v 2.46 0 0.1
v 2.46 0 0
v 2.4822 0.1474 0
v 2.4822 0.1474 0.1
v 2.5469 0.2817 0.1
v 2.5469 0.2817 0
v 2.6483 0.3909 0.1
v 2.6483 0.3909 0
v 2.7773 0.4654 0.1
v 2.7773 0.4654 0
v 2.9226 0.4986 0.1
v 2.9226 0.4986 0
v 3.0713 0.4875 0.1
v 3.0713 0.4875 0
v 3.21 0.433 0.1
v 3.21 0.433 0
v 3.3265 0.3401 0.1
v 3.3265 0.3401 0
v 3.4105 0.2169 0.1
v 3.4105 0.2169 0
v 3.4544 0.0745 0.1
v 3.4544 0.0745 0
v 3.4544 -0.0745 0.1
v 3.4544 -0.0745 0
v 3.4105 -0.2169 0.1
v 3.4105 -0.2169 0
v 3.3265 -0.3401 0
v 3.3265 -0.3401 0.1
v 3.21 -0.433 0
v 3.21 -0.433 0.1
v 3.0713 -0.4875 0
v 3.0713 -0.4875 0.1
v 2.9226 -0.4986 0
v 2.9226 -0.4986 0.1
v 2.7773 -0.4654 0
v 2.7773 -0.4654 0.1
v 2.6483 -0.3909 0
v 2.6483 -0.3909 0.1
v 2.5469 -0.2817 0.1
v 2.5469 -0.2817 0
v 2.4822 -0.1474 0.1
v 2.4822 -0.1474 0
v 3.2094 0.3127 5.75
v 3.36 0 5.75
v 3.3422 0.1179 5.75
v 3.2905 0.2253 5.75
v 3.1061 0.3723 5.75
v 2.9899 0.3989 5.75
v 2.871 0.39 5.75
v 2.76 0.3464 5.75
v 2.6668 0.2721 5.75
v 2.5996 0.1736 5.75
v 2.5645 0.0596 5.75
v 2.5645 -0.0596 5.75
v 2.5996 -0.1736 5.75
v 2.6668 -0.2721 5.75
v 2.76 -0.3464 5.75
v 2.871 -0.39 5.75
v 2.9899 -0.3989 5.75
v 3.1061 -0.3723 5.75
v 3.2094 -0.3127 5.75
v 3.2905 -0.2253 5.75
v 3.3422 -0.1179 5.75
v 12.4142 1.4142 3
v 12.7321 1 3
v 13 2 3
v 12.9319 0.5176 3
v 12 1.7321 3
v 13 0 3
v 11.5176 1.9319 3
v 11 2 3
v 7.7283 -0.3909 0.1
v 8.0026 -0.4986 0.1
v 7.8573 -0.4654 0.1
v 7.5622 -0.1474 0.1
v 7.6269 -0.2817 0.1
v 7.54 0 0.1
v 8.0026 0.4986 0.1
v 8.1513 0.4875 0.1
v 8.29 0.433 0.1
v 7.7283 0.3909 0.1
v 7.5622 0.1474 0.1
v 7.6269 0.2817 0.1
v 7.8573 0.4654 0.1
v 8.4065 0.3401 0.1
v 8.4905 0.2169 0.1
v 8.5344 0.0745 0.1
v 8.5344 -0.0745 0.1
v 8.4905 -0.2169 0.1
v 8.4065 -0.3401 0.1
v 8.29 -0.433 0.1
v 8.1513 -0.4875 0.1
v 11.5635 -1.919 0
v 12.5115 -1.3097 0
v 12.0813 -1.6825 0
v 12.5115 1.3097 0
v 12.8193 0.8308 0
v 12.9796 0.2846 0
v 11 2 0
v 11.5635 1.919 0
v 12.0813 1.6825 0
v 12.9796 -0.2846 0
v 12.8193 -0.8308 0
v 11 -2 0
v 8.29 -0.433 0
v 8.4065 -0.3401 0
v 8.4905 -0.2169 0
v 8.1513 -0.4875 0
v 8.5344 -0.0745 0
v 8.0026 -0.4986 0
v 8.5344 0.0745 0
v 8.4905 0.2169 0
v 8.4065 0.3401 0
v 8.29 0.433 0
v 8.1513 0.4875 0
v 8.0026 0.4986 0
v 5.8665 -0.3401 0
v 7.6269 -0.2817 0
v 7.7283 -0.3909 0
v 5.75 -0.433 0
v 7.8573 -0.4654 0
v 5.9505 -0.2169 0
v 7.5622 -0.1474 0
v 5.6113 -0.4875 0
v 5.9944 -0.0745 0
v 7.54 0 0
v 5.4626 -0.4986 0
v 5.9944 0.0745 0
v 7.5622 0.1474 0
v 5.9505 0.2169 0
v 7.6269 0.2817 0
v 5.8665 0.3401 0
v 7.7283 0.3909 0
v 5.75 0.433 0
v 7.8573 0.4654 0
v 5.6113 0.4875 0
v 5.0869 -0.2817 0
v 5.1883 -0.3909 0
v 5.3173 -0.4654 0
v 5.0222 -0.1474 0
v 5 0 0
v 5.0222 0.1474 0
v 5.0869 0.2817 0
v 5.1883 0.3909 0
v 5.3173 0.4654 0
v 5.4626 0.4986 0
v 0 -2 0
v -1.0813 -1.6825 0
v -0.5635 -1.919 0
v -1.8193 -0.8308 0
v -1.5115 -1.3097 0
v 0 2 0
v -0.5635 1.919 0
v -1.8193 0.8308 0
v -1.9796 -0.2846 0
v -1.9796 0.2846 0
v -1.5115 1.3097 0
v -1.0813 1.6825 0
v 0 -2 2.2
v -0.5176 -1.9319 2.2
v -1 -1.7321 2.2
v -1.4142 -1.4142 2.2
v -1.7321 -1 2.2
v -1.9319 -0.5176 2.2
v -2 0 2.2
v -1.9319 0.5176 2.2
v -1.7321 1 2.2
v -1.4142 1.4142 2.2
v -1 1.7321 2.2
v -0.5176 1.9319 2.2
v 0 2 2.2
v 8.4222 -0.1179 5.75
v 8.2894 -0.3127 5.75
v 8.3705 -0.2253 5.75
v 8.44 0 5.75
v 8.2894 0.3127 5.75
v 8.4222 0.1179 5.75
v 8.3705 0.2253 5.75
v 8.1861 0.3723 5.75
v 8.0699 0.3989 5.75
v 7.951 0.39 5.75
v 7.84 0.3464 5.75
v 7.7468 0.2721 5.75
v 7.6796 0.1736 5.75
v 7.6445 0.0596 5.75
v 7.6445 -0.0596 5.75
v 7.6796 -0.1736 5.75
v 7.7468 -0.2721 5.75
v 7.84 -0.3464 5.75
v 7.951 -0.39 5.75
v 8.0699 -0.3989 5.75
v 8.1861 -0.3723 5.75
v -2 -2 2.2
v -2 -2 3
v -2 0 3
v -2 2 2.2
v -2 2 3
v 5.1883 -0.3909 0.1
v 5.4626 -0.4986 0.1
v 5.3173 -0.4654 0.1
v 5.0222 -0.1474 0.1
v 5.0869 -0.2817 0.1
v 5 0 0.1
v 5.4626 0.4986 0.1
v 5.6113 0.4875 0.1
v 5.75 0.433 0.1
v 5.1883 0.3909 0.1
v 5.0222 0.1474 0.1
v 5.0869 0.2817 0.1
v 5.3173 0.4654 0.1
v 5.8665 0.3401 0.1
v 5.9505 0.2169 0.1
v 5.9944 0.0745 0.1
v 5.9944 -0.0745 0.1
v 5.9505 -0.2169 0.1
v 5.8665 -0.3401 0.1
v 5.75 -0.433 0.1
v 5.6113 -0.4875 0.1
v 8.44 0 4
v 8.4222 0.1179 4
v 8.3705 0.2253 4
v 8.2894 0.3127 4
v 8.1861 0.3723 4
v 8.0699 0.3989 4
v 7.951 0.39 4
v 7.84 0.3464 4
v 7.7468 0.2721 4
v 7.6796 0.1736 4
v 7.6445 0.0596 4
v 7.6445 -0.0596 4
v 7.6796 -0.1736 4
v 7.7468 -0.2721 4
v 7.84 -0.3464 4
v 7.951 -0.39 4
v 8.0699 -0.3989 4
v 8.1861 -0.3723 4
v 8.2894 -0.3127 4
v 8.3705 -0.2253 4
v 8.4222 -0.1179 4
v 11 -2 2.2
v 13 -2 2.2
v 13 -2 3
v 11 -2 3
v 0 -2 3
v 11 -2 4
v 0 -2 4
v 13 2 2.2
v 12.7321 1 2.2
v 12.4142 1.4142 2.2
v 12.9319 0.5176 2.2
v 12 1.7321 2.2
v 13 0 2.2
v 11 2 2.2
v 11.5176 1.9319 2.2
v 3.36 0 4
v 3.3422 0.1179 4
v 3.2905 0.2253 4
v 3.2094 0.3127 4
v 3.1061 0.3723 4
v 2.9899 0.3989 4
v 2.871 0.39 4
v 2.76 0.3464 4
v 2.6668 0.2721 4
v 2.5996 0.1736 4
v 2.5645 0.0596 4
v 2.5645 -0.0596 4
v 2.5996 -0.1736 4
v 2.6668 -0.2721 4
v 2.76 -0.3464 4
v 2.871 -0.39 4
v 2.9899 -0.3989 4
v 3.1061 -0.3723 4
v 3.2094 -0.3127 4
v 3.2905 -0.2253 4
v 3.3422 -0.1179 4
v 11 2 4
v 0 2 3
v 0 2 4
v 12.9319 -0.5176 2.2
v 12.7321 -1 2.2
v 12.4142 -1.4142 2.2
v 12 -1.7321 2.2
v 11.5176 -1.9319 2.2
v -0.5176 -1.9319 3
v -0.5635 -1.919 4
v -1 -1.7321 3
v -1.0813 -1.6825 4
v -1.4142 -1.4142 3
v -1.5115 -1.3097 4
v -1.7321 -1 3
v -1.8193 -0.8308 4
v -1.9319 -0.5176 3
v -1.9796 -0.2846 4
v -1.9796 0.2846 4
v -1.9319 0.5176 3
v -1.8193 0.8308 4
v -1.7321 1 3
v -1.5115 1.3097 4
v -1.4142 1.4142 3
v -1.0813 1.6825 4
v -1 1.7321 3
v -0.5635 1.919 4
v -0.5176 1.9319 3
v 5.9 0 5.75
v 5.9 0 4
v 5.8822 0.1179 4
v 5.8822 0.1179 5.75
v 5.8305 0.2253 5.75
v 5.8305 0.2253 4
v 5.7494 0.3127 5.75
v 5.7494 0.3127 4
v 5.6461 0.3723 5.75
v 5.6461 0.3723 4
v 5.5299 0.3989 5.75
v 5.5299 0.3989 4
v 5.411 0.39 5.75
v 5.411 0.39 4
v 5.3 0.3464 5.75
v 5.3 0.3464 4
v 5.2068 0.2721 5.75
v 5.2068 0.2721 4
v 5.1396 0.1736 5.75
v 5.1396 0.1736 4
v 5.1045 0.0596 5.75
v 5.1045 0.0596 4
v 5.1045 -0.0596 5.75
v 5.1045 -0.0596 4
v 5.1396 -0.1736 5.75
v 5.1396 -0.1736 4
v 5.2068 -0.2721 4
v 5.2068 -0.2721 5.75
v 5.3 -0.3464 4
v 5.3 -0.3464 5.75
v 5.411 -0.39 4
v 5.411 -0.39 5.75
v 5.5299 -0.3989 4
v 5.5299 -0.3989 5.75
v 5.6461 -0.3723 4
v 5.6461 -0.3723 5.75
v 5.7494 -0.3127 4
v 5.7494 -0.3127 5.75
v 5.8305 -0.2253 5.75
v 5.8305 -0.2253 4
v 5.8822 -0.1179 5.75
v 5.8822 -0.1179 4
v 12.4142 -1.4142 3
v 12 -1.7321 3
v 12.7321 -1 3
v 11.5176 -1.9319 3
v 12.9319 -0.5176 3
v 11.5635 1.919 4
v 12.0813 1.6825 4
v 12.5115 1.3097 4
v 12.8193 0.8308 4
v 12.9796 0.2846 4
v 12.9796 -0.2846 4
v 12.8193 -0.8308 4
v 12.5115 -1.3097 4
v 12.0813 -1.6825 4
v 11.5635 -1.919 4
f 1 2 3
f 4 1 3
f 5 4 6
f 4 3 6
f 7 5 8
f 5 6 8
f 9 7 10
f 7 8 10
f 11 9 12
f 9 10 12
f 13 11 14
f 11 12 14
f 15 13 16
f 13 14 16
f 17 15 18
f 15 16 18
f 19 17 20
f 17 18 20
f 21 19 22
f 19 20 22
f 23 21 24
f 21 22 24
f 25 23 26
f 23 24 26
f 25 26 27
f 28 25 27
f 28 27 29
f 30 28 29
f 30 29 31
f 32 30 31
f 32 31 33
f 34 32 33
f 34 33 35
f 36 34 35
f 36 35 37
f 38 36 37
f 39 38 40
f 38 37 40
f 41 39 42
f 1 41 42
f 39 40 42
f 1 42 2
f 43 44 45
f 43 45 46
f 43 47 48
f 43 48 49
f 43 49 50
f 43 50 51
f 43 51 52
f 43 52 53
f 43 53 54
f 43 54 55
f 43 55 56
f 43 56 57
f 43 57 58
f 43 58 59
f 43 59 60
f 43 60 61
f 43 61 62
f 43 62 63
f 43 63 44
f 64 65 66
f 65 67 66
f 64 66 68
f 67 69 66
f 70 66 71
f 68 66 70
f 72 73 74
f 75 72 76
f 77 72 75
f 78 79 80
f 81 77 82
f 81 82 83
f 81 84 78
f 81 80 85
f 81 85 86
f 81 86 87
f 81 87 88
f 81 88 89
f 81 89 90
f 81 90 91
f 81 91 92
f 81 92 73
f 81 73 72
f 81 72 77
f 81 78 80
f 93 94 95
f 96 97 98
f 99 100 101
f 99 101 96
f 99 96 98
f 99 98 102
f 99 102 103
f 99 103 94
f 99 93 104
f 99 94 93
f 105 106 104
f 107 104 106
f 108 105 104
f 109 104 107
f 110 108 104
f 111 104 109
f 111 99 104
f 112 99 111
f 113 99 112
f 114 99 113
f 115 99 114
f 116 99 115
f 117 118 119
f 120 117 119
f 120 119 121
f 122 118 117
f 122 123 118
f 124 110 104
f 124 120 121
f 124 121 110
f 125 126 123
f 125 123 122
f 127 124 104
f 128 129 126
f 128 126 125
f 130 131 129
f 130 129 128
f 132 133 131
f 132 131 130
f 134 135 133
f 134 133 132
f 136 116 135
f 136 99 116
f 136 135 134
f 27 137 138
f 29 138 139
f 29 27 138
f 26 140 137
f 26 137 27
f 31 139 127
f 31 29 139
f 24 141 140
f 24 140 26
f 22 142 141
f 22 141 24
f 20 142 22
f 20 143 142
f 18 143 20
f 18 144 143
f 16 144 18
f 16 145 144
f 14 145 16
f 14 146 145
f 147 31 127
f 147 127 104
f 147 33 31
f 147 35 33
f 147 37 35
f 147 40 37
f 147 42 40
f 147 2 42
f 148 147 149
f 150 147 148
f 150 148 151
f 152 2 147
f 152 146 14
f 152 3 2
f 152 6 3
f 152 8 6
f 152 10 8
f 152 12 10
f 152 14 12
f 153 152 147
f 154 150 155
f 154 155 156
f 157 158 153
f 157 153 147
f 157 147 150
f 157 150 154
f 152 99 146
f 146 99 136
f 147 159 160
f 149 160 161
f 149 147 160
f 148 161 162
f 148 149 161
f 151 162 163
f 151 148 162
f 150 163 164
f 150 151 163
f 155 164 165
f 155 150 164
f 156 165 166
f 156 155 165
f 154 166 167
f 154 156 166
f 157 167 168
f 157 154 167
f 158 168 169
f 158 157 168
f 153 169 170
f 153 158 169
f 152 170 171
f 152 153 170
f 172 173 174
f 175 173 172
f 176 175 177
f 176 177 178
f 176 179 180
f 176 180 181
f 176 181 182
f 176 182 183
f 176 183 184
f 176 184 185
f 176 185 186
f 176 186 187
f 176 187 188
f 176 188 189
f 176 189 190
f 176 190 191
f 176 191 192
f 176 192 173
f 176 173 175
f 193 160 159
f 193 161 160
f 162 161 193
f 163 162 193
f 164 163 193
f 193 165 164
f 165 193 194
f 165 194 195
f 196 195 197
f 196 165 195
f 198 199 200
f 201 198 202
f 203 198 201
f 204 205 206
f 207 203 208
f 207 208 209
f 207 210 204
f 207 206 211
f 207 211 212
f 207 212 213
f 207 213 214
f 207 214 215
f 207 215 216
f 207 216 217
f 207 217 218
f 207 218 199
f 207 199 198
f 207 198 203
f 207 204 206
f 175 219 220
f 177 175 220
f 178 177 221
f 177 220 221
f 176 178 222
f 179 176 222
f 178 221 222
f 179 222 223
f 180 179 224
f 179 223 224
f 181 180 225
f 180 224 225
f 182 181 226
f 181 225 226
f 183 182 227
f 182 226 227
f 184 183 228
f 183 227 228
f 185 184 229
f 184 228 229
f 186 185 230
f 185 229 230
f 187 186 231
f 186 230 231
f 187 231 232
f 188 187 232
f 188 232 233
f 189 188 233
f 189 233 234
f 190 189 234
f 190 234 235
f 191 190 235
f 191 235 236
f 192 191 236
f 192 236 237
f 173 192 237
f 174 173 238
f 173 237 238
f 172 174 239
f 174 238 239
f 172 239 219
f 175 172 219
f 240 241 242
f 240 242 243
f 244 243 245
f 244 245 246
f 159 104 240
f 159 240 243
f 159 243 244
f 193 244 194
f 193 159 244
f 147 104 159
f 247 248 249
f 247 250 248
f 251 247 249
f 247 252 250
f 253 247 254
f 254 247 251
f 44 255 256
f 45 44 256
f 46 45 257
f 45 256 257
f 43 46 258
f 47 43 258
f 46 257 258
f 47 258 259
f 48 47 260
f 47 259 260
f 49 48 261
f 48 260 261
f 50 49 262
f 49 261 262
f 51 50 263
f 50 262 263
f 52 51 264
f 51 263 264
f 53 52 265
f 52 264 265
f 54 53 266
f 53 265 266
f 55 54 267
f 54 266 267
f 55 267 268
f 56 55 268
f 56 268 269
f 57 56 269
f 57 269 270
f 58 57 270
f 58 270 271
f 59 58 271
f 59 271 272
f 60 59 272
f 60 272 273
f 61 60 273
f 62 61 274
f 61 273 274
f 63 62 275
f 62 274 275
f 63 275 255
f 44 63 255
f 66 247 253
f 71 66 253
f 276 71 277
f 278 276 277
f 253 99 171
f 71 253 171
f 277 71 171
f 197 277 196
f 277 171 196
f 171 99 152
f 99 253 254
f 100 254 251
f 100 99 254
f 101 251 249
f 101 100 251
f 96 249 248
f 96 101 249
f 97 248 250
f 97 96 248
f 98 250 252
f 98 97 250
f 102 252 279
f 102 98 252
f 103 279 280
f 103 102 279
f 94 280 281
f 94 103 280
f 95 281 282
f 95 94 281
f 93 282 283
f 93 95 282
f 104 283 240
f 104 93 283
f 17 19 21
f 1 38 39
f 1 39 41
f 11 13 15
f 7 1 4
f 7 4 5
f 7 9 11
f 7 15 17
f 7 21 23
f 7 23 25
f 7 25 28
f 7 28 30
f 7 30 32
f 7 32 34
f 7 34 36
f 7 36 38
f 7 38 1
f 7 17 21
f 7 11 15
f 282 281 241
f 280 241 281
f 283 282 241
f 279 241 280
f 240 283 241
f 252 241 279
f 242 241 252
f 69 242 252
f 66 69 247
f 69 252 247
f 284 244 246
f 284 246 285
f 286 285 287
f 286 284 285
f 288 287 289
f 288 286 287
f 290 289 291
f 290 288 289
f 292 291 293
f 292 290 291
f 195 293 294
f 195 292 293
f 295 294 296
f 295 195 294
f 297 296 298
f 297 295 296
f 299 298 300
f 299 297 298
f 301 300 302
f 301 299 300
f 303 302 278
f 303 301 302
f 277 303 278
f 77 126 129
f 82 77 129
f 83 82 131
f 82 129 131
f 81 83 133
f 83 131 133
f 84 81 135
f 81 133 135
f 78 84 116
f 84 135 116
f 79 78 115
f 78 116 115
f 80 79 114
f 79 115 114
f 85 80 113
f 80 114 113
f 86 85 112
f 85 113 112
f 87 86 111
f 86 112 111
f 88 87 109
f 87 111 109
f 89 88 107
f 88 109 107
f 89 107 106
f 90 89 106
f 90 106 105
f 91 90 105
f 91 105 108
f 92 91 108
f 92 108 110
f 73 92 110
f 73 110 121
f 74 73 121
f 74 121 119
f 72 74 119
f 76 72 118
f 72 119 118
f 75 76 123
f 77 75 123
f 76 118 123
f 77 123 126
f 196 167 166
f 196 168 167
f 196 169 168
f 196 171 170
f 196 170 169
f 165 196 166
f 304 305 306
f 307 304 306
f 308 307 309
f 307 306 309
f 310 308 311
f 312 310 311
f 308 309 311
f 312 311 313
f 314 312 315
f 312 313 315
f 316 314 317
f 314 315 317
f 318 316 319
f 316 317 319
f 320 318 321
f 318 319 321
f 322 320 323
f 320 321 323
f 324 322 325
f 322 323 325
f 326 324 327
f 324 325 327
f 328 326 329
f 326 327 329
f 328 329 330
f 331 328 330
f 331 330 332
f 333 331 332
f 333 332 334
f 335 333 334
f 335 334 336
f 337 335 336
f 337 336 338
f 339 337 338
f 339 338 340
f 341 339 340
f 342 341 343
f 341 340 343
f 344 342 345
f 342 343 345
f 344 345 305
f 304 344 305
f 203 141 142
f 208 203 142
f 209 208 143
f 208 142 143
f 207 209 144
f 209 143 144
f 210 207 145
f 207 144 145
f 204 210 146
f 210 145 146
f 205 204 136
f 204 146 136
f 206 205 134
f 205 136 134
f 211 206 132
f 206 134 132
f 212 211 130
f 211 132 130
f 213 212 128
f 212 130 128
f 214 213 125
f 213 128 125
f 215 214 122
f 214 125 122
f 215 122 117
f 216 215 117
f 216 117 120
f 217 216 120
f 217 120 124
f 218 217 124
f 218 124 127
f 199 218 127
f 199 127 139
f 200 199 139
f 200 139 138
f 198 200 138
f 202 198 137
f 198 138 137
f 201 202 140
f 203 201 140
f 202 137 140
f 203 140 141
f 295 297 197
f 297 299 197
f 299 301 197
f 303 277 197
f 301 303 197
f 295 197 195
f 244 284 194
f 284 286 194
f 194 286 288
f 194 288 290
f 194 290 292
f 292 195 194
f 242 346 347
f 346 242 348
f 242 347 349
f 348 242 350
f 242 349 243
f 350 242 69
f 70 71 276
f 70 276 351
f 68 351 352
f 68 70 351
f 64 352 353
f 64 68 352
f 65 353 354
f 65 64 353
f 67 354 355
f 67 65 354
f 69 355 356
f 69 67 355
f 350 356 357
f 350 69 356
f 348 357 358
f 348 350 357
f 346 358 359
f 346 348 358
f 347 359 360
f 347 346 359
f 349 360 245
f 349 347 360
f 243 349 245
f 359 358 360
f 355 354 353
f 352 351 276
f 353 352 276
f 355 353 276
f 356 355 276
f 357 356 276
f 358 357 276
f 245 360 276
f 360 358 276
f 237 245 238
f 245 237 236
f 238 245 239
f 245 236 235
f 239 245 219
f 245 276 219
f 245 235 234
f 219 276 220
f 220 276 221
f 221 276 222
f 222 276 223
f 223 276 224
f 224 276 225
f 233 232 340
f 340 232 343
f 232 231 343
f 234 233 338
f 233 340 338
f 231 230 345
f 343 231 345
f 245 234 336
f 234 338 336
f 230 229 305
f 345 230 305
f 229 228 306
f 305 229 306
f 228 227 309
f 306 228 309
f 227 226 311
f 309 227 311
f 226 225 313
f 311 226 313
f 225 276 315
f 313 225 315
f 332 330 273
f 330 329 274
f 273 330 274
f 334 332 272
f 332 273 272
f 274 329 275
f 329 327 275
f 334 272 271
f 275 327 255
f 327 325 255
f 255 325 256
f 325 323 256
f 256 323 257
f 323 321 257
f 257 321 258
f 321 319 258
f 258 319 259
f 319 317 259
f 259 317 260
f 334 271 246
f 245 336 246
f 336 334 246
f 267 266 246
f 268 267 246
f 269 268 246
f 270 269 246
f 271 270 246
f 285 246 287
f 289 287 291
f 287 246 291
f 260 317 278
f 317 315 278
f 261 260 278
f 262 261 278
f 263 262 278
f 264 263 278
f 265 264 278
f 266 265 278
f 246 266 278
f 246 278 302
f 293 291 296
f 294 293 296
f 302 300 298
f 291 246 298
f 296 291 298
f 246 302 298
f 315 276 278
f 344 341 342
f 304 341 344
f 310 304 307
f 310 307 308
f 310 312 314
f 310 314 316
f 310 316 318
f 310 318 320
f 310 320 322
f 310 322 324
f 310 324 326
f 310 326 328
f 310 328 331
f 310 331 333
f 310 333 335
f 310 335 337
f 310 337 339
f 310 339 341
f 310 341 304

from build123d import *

# Parameters (mm, degrees)
EXTRUDE_1_DEPTH     = 4
EXTRUDE_START       = -2.2
SKETCH_2_W          = 15
SKETCH_2_H          = 4
EXTRUDE_2_DEPTH     = 0.8
SKETCH_3_R          = 0.5
EXTRUDE_3_DEPTH     = 1
FILLET_1_R          = 0.5
SKETCH_4_R          = 0.4
EXTRUDE_4_DEPTH     = 1.75
CUT_EXTRUDE_START   = 1.75
CUT_EXTRUDE_1_DEPTH = 1.75
SKETCH_8_R          = 0.5
CUT_EXTRUDE_2_DEPTH = 0.1


with BuildPart() as part:
    # 草图1 → 凸台-拉伸1 (new body)
    with BuildSketch(Plane.XY):
        with BuildLine():
            Line((0, 2), (11, 2))
            ThreePointArc((11, 2), (13, 0), (11, -2))
            Line((11, -2), (0, -2))
            ThreePointArc((0, -2), (-2, 0), (0, 2))
        make_face()
    extrude(amount=EXTRUDE_1_DEPTH)

    # 草图2 → 凸台-拉伸2 (add)
    with BuildSketch(Plane(origin=(0, 0, 0), x_dir=(-1, 0, 0), z_dir=(0, 0, -1)).offset(EXTRUDE_START)):
        with Locations((-5.5, 0)):
            Rectangle(SKETCH_2_W, SKETCH_2_H)
    extrude(amount=-EXTRUDE_2_DEPTH)

    # 草图3 → 凸台-拉伸3 (add)
    with BuildSketch(Plane(origin=(0, 0, 0), x_dir=(-1, 0, 0), z_dir=(0, 0, -1))):
        with Locations(Location((-8.04, 0, 0), (0, 0, 180))):
            Circle(SKETCH_3_R)
        with Locations(Location((-5.5, 0, 0), (0, 0, 180))):
            Circle(SKETCH_3_R)
        with Locations(Location((-2.96, 0, 0), (0, 0, 180))):
            Circle(SKETCH_3_R)
    extrude(amount=EXTRUDE_3_DEPTH)

    # 圆角1
    fillet_1_edges = [part.edges().sort_by_distance(p)[0] for p in [
        (7.54, 0, -1),
        (5, 0, -1),
        (2.46, 0, -1),
    ]]
    fillet(fillet_1_edges, radius=FILLET_1_R)

    # 草图4 → 凸台-拉伸4 (add)
    with BuildSketch(Plane.XY.offset(4)):
        with Locations((2.96, 0)):
            Circle(SKETCH_4_R)
        with Locations((5.5, 0)):
            Circle(SKETCH_4_R)
        with Locations((8.04, 0)):
            Circle(SKETCH_4_R)
    extrude(amount=EXTRUDE_4_DEPTH)

    # 草图7 → 切除-拉伸1 (cut)
    with BuildSketch(Plane(origin=(0, 0, 0), x_dir=(-1, 0, 0), z_dir=(0, 0, -1)).offset(CUT_EXTRUDE_START)):
        with BuildLine():
            Line((0, 2), (-11, 2))
            ThreePointArc((-11, 2), (-13, 0), (-11, -2))
            Line((-11, -2), (0, -2))
            ThreePointArc((0, -2), (2, 0), (0, 2))
        make_face()
    extrude(amount=-CUT_EXTRUDE_1_DEPTH, mode=Mode.SUBTRACT)

    # 草图8 → 切除-拉伸2 (cut)
    with BuildSketch(Plane(origin=(0, 0, 0), x_dir=(-1, 0, 0), z_dir=(0, 0, -1))):
        with Locations((-8.04, 0)):
            Circle(SKETCH_8_R)
        with Locations((-5.5, 0)):
            Circle(SKETCH_8_R)
        with Locations((-2.96, 0)):
            Circle(SKETCH_8_R)
    extrude(amount=-CUT_EXTRUDE_2_DEPTH, mode=Mode.SUBTRACT)


solid = part.part
